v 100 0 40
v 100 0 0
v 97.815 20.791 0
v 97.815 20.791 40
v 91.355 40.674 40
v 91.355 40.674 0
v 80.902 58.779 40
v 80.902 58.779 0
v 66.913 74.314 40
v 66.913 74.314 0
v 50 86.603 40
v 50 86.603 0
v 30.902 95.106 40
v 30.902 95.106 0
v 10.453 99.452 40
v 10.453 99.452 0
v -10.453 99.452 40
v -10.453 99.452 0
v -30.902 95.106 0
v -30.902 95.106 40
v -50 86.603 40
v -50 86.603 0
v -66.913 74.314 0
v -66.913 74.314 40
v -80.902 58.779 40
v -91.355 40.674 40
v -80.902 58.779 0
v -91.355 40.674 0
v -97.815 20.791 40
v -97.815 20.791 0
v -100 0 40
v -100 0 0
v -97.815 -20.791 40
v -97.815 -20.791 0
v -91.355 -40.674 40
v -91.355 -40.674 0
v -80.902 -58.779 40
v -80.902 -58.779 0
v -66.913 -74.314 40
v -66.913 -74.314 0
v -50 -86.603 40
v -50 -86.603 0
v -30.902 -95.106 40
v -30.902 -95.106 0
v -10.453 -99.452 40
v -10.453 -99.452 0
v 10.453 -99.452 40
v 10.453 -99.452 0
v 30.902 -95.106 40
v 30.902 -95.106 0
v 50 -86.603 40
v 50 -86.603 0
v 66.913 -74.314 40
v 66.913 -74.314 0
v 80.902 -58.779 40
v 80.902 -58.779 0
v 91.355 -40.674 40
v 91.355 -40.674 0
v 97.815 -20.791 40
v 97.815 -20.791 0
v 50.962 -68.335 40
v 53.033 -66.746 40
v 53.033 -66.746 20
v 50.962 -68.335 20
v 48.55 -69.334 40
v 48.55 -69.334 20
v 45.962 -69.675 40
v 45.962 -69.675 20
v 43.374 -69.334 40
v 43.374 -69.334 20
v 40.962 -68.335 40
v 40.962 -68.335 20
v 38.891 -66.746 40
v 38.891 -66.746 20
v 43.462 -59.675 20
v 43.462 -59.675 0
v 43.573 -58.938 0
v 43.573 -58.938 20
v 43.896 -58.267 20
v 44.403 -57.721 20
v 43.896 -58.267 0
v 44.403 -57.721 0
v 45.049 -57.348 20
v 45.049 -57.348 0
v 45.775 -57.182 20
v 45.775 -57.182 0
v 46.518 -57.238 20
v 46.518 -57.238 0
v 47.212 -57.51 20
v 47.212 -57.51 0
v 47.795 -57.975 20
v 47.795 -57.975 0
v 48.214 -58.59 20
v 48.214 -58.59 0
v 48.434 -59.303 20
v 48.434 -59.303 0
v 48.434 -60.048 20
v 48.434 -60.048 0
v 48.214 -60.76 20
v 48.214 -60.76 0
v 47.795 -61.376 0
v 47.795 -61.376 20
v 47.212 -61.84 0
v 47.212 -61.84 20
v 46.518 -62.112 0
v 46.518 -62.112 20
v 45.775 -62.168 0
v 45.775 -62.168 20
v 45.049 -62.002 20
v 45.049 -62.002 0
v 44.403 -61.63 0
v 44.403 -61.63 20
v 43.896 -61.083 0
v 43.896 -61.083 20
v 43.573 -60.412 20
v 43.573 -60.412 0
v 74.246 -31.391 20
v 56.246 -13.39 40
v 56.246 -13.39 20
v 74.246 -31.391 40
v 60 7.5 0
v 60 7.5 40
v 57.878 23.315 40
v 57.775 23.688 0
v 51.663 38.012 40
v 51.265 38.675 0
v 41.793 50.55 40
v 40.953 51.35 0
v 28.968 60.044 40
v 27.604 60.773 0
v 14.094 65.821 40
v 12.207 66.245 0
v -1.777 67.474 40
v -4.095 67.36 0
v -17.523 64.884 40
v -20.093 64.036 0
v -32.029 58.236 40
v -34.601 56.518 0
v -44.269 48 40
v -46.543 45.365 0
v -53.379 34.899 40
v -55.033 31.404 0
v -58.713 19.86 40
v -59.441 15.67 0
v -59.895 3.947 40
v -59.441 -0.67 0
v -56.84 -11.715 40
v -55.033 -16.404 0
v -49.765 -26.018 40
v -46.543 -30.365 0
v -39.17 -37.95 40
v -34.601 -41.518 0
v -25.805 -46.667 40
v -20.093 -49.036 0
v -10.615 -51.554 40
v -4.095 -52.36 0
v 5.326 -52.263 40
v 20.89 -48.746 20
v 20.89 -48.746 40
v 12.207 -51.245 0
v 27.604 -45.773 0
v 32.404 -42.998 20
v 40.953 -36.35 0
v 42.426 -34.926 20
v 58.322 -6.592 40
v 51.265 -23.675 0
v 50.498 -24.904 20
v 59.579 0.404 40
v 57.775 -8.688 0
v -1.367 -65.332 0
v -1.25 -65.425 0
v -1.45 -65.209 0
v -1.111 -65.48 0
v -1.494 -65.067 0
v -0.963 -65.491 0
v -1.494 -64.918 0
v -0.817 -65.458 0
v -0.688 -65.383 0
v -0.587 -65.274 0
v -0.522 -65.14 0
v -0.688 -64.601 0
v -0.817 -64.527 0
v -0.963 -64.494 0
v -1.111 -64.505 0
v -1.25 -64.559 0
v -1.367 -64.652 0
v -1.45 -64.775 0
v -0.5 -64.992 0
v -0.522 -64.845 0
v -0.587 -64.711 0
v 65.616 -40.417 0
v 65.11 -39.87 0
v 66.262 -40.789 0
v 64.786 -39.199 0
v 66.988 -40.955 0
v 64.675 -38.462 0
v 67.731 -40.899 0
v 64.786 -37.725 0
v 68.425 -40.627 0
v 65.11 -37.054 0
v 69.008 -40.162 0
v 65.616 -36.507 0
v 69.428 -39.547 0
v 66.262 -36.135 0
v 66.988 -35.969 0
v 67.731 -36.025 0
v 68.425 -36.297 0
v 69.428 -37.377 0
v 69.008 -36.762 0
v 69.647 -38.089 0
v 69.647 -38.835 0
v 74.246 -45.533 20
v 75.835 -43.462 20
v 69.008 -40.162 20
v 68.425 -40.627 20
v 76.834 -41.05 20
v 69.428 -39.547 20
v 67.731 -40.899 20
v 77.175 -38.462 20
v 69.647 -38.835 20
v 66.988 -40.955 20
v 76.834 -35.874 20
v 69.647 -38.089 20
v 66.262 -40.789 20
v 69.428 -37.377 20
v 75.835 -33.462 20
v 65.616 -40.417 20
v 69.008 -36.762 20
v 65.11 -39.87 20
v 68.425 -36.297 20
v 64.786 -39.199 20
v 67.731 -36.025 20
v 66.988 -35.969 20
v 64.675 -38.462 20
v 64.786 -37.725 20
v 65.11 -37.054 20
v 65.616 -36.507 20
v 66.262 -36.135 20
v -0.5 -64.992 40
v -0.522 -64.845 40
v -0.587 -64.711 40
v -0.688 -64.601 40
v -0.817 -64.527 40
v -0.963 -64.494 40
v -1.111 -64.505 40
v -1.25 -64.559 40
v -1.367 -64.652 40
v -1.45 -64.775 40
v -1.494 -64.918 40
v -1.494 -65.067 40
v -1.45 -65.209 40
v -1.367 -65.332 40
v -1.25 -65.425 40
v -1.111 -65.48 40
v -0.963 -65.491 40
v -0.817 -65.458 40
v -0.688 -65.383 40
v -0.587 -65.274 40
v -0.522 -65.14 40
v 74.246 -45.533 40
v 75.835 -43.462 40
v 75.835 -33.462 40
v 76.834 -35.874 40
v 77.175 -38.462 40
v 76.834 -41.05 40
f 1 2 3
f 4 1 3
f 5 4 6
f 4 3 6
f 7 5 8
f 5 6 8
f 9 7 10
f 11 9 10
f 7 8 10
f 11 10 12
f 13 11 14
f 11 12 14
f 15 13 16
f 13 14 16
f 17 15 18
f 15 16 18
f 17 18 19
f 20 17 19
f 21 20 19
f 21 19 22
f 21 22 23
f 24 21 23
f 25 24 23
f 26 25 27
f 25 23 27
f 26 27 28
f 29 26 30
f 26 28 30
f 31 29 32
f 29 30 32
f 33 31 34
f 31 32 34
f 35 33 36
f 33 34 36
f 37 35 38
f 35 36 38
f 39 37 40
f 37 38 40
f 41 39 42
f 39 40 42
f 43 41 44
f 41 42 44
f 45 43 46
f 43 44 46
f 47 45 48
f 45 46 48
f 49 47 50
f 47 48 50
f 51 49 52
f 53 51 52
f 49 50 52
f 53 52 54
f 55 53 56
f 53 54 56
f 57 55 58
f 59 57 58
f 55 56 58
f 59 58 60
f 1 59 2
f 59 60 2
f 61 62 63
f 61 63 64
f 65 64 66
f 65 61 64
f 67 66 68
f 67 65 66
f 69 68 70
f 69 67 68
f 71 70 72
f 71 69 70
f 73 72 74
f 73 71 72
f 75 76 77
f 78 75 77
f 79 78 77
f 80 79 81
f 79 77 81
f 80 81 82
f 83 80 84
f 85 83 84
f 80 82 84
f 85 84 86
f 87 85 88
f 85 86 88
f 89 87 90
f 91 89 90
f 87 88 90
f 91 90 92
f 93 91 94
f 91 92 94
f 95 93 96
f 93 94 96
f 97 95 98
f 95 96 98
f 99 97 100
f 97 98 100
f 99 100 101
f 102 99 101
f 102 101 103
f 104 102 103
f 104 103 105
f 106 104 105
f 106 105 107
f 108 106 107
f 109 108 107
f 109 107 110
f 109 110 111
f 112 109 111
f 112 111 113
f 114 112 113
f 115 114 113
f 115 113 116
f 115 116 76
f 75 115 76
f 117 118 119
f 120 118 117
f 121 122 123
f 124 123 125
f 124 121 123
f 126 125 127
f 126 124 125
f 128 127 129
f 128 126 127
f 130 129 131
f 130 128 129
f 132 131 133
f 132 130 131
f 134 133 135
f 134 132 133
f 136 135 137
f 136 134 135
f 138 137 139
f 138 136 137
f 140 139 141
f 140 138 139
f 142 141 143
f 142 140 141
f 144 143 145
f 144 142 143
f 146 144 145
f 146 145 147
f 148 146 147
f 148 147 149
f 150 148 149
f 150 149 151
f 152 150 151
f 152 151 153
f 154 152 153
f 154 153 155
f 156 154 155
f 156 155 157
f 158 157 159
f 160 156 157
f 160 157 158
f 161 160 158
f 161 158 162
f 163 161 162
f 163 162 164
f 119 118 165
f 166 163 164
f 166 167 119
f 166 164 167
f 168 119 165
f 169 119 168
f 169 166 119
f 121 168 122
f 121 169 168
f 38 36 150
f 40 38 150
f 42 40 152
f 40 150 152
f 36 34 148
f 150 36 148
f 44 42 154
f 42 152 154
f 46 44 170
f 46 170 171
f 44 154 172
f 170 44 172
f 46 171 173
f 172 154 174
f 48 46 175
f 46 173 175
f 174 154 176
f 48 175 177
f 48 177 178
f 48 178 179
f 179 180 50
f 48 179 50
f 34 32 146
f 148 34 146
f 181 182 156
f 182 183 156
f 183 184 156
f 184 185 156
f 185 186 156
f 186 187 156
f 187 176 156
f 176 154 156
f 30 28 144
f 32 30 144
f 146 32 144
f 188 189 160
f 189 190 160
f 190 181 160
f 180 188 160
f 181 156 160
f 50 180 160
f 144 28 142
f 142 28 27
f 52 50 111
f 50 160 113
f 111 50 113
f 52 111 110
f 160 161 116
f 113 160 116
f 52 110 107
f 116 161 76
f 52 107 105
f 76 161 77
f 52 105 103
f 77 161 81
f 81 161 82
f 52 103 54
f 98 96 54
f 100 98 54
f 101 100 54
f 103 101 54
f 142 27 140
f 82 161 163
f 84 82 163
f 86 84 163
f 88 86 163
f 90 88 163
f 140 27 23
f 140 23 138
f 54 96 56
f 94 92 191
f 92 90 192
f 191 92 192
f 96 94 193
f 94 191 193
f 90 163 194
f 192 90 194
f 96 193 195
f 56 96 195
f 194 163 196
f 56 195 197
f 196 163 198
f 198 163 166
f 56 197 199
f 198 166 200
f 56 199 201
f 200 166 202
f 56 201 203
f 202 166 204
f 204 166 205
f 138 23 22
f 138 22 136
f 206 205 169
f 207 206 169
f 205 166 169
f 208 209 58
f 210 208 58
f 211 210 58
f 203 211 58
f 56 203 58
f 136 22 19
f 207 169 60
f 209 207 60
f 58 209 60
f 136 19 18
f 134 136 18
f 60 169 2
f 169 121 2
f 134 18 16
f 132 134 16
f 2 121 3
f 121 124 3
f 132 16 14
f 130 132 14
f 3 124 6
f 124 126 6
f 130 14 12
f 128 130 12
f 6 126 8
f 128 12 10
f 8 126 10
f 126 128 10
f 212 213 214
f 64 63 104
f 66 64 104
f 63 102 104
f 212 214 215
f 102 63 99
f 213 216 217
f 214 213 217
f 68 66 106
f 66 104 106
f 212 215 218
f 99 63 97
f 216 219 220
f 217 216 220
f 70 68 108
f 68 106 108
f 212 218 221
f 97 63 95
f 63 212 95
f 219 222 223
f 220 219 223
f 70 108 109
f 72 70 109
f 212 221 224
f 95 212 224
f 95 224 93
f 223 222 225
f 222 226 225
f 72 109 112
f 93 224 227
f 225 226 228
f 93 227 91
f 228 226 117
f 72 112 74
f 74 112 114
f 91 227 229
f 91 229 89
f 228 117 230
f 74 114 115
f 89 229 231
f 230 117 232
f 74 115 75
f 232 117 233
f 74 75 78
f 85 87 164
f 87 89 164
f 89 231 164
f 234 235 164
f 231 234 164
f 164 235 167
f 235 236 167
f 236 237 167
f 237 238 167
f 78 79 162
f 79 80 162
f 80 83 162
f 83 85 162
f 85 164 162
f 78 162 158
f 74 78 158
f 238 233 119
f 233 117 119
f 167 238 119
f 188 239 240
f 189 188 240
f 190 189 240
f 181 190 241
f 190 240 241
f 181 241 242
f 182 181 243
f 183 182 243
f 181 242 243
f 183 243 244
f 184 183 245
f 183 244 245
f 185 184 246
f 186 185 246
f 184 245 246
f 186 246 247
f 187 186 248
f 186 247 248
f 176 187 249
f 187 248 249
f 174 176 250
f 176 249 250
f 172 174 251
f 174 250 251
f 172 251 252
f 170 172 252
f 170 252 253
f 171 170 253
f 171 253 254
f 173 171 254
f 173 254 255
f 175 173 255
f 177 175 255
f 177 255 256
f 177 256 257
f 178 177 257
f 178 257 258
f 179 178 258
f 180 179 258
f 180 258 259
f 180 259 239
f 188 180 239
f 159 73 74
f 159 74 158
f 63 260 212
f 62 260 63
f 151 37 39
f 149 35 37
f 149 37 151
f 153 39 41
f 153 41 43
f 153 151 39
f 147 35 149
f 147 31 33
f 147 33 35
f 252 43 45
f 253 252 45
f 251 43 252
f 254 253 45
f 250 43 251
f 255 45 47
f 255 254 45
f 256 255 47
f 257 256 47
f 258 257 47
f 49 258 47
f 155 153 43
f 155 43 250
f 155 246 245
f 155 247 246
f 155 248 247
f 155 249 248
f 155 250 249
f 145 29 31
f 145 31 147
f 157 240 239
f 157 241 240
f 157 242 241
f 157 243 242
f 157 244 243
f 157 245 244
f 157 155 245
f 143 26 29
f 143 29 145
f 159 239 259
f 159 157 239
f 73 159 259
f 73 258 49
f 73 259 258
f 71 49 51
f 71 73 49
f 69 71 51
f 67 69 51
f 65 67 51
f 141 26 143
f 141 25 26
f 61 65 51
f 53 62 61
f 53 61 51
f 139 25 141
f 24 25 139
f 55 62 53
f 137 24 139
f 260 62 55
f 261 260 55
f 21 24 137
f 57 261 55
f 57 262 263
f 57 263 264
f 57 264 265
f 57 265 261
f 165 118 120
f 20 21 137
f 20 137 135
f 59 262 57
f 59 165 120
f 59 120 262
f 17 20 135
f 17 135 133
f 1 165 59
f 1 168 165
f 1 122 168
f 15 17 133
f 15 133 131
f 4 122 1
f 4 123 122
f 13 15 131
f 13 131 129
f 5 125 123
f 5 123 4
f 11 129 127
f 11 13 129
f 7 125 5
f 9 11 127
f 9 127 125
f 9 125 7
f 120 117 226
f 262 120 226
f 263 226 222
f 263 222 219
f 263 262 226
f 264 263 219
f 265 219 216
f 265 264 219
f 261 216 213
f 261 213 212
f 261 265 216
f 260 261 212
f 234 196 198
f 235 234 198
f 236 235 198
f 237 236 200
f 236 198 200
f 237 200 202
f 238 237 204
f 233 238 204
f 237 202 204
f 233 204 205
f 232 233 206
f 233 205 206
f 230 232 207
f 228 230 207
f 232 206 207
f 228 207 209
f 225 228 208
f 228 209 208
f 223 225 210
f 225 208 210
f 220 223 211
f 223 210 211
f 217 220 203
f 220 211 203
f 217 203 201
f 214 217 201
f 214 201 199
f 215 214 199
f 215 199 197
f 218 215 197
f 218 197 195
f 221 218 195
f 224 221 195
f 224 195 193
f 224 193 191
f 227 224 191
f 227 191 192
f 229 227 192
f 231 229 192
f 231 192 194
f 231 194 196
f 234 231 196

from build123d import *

# Parameters (mm, degrees)
SKIZZE1_R                       = 100
SKIZZE1_R_2                     = 60
BASIS_LINEAR_AUSTRAGEN_DEPTH    = 40
SCHNITT_LINEAR_AUSTRAGEN1_DEPTH = 20
SKIZZE4_R                       = 0.5
SCHNITT_LINEAR_AUSTRAGEN3_DEPTH = 41
M6X1_0_GEWINDEKERNLOCH1_D       = 5


with BuildPart() as part:
    # Skizze1 → Basis-Linear austragen (new body)
    with BuildSketch(Plane.XY):
        Circle(SKIZZE1_R)
        with Locations((0, 7.5)):
            Circle(SKIZZE1_R_2, mode=Mode.SUBTRACT)
    extrude(amount=BASIS_LINEAR_AUSTRAGEN_DEPTH)

    # Skizze2 → Schnitt-Linear austragen1 (cut)
    with BuildSketch(Plane.XY.offset(40)):
        with BuildLine():
            Line((17.272249399, -45.127588459), (52.627588459, -9.772249399))
            Line((52.627588459, -9.772249399), (74.246212025, -31.390872965))
            ThreePointArc((74.246212025, -31.390872965), (77.175144213, -38.461940777), (74.246212025, -45.533008589))
            Line((74.246212025, -45.533008589), (53.033008589, -66.746212025))
            ThreePointArc((53.033008589, -66.746212025), (45.961940777, -69.675144213), (38.890872965, -66.746212025))
            Line((38.890872965, -66.746212025), (17.272249399, -45.127588459))
        make_face()
    extrude(amount=-SCHNITT_LINEAR_AUSTRAGEN1_DEPTH, mode=Mode.SUBTRACT)

    # Skizze4 → Schnitt-Linear austragen3 (cut, through all)
    with BuildSketch(Plane.XY.offset(40)):
        with Locations((-1, -64.992307237)):
            Circle(SKIZZE4_R)
    extrude(amount=-SCHNITT_LINEAR_AUSTRAGEN3_DEPTH, mode=Mode.SUBTRACT)

    # M6x1.0 Gewindekernloch1 (through all)
    with Locations(Plane.XY.offset(20)):
        with Locations((45.961940777, -59.675144213), (67.175144213, -38.461940777)):
            Hole(M6X1_0_GEWINDEKERNLOCH1_D / 2)


solid = part.part
